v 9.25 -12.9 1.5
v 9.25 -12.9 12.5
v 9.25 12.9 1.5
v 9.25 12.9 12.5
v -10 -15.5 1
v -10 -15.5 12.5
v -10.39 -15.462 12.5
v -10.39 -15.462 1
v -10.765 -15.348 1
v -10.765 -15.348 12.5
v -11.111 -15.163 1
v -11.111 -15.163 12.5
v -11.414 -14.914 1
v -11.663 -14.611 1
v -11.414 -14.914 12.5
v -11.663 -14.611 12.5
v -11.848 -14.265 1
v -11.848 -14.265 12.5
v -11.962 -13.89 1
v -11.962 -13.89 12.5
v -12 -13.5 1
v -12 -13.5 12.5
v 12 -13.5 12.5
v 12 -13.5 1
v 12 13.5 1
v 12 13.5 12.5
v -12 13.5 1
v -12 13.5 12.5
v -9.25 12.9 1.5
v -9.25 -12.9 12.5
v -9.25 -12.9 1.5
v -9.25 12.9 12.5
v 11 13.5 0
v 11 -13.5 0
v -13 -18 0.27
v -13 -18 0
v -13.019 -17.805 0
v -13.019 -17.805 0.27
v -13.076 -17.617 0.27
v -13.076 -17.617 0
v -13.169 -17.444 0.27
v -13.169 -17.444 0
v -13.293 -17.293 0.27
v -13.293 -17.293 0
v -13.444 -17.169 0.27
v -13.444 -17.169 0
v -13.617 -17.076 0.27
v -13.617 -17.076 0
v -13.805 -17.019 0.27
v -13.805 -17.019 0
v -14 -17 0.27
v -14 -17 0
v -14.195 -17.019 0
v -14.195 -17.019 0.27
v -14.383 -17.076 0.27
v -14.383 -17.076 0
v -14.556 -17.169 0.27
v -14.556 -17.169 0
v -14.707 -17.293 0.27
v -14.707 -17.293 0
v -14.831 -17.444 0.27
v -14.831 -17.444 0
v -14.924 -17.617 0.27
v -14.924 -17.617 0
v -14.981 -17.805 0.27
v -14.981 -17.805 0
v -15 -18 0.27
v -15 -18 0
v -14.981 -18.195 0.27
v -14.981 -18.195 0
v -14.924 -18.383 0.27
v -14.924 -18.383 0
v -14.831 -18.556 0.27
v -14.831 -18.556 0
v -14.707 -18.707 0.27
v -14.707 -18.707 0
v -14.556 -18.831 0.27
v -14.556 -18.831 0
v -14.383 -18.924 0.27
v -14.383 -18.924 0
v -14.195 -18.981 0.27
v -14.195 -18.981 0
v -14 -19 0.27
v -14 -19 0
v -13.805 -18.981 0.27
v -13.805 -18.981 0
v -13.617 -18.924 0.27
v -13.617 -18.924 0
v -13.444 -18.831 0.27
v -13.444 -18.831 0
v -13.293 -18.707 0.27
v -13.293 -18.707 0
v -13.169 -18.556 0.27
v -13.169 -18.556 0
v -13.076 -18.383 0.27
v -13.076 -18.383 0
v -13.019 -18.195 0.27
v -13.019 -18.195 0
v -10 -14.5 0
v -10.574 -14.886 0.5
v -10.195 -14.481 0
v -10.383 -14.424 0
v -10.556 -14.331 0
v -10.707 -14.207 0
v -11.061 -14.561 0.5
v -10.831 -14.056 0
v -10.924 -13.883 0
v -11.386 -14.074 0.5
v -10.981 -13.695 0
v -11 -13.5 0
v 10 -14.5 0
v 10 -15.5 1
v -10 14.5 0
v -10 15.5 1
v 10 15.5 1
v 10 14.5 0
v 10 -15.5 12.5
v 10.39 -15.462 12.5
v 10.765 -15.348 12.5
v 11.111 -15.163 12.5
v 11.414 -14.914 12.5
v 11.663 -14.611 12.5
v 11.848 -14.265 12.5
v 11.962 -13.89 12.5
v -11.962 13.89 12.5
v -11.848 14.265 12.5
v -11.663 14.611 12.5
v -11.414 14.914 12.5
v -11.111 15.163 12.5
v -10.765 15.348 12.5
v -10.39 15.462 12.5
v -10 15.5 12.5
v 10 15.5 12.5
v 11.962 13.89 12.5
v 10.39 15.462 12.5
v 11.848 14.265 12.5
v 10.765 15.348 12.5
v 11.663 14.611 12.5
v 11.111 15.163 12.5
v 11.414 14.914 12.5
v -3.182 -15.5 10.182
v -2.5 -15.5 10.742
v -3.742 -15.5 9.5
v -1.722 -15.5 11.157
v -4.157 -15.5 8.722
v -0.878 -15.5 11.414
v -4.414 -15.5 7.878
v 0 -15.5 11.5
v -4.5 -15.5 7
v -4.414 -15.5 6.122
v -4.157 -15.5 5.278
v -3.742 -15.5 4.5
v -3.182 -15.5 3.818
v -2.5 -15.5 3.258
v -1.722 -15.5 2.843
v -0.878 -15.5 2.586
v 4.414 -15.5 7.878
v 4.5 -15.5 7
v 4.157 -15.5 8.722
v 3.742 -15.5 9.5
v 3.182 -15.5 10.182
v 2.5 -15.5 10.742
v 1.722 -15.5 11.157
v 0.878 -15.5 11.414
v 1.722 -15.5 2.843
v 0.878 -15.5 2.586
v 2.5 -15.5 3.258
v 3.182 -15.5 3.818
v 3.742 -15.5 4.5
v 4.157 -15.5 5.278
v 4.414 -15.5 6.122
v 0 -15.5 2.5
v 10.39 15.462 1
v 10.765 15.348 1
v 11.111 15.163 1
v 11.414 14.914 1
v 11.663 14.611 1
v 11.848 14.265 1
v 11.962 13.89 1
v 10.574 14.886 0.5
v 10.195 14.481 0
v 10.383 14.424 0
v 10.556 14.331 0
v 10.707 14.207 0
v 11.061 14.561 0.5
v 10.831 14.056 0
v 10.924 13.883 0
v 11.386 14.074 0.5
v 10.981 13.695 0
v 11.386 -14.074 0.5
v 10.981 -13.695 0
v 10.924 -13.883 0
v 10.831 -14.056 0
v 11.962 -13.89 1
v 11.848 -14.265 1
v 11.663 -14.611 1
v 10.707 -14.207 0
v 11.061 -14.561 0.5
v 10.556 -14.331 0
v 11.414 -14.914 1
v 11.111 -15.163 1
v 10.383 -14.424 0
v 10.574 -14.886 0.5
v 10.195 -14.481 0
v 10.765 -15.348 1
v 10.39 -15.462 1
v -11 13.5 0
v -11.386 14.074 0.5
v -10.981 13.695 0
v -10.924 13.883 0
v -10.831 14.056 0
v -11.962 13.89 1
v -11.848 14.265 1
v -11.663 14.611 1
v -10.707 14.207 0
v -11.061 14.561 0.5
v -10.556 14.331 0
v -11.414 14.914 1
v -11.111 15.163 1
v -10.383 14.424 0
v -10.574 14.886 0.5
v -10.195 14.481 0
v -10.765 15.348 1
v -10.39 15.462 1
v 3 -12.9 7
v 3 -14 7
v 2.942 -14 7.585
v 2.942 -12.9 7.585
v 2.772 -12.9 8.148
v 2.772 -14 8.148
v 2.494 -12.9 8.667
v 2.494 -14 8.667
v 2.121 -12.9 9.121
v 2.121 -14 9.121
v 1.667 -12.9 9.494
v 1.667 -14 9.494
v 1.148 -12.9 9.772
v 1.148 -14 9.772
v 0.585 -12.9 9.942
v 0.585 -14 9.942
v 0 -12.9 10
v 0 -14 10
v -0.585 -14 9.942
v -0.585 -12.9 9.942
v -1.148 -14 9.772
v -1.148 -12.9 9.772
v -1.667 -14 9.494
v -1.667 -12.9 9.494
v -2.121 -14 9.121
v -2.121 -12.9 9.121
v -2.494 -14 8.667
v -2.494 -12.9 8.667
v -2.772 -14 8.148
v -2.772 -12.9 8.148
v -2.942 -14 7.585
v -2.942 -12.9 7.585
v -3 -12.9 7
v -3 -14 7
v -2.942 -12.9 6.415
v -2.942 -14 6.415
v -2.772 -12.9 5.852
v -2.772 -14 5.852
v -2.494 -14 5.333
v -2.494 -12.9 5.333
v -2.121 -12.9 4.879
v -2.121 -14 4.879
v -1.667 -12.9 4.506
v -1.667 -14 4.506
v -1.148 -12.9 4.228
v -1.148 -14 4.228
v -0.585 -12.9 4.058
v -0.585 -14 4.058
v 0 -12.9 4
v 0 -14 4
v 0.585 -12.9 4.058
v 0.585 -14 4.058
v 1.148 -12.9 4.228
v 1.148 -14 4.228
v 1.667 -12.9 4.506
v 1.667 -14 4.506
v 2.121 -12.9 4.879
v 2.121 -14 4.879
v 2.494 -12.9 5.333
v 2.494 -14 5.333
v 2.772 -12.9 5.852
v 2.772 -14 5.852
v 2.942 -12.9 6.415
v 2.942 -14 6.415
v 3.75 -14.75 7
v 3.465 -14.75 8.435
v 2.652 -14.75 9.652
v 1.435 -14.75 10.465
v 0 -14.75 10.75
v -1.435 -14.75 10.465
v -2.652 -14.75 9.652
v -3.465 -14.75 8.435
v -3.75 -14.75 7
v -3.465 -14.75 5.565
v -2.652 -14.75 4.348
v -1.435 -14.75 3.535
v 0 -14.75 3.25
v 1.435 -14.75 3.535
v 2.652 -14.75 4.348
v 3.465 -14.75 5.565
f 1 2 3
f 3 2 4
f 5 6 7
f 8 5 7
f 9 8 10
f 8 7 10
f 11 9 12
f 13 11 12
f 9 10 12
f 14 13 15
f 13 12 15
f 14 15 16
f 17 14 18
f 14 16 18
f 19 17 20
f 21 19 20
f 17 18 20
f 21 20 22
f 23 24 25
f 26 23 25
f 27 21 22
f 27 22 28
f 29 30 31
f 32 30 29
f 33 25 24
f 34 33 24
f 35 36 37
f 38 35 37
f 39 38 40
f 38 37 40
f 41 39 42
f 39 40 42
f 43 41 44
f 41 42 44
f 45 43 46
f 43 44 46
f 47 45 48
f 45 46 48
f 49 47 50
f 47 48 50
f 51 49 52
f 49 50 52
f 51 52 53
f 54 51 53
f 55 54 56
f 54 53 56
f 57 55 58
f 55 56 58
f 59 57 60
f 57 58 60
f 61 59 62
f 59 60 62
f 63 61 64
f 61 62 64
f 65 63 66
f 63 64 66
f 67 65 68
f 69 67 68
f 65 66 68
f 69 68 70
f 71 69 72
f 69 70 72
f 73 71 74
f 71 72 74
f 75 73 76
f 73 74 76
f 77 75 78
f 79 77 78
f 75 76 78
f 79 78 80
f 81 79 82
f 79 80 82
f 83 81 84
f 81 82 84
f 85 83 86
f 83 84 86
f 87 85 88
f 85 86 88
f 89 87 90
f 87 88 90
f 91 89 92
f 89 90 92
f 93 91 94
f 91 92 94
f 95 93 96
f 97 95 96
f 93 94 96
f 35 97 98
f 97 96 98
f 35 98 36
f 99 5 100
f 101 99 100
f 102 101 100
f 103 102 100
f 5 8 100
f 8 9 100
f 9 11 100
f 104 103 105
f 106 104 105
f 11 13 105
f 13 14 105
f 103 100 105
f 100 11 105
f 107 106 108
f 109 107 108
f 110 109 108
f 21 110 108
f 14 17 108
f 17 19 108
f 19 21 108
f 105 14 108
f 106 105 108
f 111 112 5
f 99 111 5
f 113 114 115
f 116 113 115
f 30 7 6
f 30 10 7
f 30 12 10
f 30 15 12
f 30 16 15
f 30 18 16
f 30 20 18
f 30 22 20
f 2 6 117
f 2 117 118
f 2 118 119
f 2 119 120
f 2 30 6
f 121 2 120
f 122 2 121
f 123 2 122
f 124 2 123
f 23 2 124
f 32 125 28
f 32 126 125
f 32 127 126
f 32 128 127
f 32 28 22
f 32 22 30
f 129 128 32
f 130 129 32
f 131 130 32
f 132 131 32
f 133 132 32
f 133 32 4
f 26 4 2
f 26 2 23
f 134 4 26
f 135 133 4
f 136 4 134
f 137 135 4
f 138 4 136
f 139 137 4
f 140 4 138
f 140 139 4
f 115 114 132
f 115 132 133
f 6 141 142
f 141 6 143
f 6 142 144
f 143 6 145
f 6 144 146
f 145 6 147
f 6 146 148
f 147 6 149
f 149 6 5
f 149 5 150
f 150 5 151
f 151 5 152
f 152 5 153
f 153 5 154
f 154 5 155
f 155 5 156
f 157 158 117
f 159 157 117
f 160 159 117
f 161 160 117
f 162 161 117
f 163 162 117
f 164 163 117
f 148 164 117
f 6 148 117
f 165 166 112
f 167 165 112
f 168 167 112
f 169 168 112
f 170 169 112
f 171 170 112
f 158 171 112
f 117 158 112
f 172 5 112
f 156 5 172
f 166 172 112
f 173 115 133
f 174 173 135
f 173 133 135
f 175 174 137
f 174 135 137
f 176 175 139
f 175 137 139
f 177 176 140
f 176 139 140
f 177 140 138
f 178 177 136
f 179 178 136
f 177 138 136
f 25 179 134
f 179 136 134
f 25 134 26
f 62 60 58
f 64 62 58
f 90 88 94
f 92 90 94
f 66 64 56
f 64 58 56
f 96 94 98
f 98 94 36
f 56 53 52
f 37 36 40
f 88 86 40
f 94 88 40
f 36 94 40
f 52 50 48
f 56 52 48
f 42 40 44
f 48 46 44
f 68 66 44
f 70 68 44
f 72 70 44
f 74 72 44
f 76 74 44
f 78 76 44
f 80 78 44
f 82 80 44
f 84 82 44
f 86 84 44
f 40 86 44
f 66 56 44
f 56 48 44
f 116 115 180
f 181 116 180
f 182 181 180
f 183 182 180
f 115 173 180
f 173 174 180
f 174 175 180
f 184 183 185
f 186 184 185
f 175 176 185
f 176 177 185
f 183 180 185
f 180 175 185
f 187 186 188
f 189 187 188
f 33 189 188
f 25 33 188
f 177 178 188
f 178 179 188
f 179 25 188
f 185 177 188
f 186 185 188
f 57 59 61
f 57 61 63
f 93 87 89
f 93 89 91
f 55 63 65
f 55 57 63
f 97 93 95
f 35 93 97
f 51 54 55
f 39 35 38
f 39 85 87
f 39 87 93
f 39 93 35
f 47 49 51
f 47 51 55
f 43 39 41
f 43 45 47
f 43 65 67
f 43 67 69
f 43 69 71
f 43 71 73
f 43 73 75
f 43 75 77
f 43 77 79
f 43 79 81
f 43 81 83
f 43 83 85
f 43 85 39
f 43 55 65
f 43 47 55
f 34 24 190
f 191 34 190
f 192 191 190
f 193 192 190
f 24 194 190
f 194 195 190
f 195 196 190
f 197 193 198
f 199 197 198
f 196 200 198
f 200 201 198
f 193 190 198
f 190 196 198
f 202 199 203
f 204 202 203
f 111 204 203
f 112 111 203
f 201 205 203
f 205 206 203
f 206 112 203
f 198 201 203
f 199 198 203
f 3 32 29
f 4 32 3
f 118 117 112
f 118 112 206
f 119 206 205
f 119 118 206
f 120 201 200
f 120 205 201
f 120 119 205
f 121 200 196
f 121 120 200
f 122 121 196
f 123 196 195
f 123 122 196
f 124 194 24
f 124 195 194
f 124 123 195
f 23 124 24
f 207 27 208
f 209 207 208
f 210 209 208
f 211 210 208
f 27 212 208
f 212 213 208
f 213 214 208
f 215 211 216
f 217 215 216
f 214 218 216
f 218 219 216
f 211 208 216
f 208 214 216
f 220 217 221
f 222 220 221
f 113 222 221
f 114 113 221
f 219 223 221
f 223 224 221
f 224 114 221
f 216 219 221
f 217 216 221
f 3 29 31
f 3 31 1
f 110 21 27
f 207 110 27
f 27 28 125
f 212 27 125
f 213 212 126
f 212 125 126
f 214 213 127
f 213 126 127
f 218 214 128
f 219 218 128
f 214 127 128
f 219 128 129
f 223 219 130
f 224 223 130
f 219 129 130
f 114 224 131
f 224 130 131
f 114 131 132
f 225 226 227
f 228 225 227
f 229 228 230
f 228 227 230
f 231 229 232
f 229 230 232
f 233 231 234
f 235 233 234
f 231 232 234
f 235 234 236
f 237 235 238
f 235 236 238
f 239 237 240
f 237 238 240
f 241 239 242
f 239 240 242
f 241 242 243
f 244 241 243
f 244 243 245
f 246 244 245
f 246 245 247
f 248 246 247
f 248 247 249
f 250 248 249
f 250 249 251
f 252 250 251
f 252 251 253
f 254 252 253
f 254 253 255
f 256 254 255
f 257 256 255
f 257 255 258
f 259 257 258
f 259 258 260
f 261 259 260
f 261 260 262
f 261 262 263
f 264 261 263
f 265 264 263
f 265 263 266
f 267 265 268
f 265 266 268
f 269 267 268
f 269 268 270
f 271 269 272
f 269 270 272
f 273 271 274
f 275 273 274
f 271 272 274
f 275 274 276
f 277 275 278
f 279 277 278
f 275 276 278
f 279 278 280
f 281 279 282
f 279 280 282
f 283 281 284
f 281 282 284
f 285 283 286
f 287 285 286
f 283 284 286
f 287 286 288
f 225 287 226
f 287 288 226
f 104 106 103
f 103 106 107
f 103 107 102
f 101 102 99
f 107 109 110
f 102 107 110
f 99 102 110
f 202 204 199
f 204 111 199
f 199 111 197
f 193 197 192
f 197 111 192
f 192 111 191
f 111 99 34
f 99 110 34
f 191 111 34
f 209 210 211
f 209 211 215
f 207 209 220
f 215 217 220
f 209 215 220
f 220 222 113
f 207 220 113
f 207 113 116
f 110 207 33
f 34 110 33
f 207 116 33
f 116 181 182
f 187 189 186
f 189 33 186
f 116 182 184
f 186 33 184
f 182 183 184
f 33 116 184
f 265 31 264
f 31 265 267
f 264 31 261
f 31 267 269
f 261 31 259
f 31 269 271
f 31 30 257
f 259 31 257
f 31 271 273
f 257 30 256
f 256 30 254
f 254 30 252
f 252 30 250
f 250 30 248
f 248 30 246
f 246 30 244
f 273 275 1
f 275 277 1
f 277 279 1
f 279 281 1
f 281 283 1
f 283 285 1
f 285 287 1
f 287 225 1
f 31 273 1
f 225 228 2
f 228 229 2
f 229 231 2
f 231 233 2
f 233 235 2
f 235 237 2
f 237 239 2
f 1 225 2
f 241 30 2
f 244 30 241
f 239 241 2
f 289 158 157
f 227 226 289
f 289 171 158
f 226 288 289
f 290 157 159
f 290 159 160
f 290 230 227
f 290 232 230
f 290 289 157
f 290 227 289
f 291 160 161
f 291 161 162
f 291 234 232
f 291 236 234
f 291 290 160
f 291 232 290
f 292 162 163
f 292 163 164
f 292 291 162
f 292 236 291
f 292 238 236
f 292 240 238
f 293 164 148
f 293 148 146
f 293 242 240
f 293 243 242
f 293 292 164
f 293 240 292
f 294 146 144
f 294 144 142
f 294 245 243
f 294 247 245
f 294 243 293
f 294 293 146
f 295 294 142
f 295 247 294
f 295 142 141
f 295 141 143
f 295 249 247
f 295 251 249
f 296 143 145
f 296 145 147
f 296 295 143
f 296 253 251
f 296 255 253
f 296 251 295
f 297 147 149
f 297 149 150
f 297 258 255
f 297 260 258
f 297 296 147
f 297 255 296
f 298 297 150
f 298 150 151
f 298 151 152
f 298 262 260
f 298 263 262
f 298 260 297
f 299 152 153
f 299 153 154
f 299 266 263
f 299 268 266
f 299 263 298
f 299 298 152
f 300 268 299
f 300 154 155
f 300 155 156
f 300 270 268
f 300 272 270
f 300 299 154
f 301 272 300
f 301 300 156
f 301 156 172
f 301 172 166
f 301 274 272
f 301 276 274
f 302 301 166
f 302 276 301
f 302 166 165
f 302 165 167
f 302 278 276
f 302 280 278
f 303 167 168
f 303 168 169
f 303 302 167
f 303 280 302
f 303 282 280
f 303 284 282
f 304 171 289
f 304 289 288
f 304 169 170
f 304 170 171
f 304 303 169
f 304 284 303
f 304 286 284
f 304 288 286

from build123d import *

# Parameters (mm, degrees)
SKETCH_W        = 24
SKETCH_H        = 31
PAD_DEPTH       = 12.5
SKETCH001_R     = 3
POCKET_DEPTH    = 3
SKETCH002_W     = 18.5
SKETCH002_H     = 25.8
POCKET001_DEPTH = 11
CHAMFER_SIZE    = 1.5
FILLET_R        = 2
FILLET001_R     = 2
FILLET002_R     = 2
FILLET003_R     = 2
CHAMFER001_SIZE = 1
SKETCH003_R     = 1
PAD001_DEPTH    = 0.27


with BuildPart() as chamfer001:
    # Sketch → Pad (new body)
    with BuildSketch(Plane.XY):
        Rectangle(SKETCH_W, SKETCH_H)
    extrude(amount=PAD_DEPTH)

    # Sketch001 → Pocket (cut)
    with BuildSketch(Plane.XZ.offset(15.5)):
        with Locations((0, 7)):
            Circle(SKETCH001_R)
    extrude(amount=-POCKET_DEPTH, mode=Mode.SUBTRACT)

    # Sketch002 → Pocket001 (cut)
    with BuildSketch(Plane.XY.offset(12.5)):
        Rectangle(SKETCH002_W, SKETCH002_H)
    extrude(amount=-POCKET001_DEPTH, mode=Mode.SUBTRACT)

    # Chamfer
    chamfer_edges = [chamfer001.edges().sort_by_distance(p)[0] for p in [
        (-3, -15.5, 7),
    ]]
    chamfer(chamfer_edges, length=CHAMFER_SIZE)

    # Fillet
    fillet_edges = [chamfer001.edges().sort_by_distance(p)[0] for p in [
        (12, -15.5, 6.25),
    ]]
    fillet(fillet_edges, radius=FILLET_R)

    # Fillet001
    fillet001_edges = [chamfer001.edges().sort_by_distance(p)[0] for p in [
        (-12, -15.5, 6.25),
    ]]
    fillet(fillet001_edges, radius=FILLET001_R)

    # Fillet002
    fillet002_edges = [chamfer001.edges().sort_by_distance(p)[0] for p in [
        (-12, 15.5, 6.25),
    ]]
    fillet(fillet002_edges, radius=FILLET002_R)

    # Fillet003
    fillet003_edges = [chamfer001.edges().sort_by_distance(p)[0] for p in [
        (12, 15.5, 6.25),
    ]]
    fillet(fillet003_edges, radius=FILLET003_R)

    # Chamfer001
    chamfer001_edges = [chamfer001.edges().sort_by_distance(p)[0] for p in [
        (-12, 0, 0),
    ]]
    chamfer(chamfer001_edges, length=CHAMFER001_SIZE)


with BuildPart() as pad001:
    # Sketch003 → Pad001 (new body)
    with BuildSketch(Plane.XY):
        with Locations((-14, -18)):
            Circle(SKETCH003_R)
    extrude(amount=PAD001_DEPTH)


solid = Compound([chamfer001.part, pad001.part])
